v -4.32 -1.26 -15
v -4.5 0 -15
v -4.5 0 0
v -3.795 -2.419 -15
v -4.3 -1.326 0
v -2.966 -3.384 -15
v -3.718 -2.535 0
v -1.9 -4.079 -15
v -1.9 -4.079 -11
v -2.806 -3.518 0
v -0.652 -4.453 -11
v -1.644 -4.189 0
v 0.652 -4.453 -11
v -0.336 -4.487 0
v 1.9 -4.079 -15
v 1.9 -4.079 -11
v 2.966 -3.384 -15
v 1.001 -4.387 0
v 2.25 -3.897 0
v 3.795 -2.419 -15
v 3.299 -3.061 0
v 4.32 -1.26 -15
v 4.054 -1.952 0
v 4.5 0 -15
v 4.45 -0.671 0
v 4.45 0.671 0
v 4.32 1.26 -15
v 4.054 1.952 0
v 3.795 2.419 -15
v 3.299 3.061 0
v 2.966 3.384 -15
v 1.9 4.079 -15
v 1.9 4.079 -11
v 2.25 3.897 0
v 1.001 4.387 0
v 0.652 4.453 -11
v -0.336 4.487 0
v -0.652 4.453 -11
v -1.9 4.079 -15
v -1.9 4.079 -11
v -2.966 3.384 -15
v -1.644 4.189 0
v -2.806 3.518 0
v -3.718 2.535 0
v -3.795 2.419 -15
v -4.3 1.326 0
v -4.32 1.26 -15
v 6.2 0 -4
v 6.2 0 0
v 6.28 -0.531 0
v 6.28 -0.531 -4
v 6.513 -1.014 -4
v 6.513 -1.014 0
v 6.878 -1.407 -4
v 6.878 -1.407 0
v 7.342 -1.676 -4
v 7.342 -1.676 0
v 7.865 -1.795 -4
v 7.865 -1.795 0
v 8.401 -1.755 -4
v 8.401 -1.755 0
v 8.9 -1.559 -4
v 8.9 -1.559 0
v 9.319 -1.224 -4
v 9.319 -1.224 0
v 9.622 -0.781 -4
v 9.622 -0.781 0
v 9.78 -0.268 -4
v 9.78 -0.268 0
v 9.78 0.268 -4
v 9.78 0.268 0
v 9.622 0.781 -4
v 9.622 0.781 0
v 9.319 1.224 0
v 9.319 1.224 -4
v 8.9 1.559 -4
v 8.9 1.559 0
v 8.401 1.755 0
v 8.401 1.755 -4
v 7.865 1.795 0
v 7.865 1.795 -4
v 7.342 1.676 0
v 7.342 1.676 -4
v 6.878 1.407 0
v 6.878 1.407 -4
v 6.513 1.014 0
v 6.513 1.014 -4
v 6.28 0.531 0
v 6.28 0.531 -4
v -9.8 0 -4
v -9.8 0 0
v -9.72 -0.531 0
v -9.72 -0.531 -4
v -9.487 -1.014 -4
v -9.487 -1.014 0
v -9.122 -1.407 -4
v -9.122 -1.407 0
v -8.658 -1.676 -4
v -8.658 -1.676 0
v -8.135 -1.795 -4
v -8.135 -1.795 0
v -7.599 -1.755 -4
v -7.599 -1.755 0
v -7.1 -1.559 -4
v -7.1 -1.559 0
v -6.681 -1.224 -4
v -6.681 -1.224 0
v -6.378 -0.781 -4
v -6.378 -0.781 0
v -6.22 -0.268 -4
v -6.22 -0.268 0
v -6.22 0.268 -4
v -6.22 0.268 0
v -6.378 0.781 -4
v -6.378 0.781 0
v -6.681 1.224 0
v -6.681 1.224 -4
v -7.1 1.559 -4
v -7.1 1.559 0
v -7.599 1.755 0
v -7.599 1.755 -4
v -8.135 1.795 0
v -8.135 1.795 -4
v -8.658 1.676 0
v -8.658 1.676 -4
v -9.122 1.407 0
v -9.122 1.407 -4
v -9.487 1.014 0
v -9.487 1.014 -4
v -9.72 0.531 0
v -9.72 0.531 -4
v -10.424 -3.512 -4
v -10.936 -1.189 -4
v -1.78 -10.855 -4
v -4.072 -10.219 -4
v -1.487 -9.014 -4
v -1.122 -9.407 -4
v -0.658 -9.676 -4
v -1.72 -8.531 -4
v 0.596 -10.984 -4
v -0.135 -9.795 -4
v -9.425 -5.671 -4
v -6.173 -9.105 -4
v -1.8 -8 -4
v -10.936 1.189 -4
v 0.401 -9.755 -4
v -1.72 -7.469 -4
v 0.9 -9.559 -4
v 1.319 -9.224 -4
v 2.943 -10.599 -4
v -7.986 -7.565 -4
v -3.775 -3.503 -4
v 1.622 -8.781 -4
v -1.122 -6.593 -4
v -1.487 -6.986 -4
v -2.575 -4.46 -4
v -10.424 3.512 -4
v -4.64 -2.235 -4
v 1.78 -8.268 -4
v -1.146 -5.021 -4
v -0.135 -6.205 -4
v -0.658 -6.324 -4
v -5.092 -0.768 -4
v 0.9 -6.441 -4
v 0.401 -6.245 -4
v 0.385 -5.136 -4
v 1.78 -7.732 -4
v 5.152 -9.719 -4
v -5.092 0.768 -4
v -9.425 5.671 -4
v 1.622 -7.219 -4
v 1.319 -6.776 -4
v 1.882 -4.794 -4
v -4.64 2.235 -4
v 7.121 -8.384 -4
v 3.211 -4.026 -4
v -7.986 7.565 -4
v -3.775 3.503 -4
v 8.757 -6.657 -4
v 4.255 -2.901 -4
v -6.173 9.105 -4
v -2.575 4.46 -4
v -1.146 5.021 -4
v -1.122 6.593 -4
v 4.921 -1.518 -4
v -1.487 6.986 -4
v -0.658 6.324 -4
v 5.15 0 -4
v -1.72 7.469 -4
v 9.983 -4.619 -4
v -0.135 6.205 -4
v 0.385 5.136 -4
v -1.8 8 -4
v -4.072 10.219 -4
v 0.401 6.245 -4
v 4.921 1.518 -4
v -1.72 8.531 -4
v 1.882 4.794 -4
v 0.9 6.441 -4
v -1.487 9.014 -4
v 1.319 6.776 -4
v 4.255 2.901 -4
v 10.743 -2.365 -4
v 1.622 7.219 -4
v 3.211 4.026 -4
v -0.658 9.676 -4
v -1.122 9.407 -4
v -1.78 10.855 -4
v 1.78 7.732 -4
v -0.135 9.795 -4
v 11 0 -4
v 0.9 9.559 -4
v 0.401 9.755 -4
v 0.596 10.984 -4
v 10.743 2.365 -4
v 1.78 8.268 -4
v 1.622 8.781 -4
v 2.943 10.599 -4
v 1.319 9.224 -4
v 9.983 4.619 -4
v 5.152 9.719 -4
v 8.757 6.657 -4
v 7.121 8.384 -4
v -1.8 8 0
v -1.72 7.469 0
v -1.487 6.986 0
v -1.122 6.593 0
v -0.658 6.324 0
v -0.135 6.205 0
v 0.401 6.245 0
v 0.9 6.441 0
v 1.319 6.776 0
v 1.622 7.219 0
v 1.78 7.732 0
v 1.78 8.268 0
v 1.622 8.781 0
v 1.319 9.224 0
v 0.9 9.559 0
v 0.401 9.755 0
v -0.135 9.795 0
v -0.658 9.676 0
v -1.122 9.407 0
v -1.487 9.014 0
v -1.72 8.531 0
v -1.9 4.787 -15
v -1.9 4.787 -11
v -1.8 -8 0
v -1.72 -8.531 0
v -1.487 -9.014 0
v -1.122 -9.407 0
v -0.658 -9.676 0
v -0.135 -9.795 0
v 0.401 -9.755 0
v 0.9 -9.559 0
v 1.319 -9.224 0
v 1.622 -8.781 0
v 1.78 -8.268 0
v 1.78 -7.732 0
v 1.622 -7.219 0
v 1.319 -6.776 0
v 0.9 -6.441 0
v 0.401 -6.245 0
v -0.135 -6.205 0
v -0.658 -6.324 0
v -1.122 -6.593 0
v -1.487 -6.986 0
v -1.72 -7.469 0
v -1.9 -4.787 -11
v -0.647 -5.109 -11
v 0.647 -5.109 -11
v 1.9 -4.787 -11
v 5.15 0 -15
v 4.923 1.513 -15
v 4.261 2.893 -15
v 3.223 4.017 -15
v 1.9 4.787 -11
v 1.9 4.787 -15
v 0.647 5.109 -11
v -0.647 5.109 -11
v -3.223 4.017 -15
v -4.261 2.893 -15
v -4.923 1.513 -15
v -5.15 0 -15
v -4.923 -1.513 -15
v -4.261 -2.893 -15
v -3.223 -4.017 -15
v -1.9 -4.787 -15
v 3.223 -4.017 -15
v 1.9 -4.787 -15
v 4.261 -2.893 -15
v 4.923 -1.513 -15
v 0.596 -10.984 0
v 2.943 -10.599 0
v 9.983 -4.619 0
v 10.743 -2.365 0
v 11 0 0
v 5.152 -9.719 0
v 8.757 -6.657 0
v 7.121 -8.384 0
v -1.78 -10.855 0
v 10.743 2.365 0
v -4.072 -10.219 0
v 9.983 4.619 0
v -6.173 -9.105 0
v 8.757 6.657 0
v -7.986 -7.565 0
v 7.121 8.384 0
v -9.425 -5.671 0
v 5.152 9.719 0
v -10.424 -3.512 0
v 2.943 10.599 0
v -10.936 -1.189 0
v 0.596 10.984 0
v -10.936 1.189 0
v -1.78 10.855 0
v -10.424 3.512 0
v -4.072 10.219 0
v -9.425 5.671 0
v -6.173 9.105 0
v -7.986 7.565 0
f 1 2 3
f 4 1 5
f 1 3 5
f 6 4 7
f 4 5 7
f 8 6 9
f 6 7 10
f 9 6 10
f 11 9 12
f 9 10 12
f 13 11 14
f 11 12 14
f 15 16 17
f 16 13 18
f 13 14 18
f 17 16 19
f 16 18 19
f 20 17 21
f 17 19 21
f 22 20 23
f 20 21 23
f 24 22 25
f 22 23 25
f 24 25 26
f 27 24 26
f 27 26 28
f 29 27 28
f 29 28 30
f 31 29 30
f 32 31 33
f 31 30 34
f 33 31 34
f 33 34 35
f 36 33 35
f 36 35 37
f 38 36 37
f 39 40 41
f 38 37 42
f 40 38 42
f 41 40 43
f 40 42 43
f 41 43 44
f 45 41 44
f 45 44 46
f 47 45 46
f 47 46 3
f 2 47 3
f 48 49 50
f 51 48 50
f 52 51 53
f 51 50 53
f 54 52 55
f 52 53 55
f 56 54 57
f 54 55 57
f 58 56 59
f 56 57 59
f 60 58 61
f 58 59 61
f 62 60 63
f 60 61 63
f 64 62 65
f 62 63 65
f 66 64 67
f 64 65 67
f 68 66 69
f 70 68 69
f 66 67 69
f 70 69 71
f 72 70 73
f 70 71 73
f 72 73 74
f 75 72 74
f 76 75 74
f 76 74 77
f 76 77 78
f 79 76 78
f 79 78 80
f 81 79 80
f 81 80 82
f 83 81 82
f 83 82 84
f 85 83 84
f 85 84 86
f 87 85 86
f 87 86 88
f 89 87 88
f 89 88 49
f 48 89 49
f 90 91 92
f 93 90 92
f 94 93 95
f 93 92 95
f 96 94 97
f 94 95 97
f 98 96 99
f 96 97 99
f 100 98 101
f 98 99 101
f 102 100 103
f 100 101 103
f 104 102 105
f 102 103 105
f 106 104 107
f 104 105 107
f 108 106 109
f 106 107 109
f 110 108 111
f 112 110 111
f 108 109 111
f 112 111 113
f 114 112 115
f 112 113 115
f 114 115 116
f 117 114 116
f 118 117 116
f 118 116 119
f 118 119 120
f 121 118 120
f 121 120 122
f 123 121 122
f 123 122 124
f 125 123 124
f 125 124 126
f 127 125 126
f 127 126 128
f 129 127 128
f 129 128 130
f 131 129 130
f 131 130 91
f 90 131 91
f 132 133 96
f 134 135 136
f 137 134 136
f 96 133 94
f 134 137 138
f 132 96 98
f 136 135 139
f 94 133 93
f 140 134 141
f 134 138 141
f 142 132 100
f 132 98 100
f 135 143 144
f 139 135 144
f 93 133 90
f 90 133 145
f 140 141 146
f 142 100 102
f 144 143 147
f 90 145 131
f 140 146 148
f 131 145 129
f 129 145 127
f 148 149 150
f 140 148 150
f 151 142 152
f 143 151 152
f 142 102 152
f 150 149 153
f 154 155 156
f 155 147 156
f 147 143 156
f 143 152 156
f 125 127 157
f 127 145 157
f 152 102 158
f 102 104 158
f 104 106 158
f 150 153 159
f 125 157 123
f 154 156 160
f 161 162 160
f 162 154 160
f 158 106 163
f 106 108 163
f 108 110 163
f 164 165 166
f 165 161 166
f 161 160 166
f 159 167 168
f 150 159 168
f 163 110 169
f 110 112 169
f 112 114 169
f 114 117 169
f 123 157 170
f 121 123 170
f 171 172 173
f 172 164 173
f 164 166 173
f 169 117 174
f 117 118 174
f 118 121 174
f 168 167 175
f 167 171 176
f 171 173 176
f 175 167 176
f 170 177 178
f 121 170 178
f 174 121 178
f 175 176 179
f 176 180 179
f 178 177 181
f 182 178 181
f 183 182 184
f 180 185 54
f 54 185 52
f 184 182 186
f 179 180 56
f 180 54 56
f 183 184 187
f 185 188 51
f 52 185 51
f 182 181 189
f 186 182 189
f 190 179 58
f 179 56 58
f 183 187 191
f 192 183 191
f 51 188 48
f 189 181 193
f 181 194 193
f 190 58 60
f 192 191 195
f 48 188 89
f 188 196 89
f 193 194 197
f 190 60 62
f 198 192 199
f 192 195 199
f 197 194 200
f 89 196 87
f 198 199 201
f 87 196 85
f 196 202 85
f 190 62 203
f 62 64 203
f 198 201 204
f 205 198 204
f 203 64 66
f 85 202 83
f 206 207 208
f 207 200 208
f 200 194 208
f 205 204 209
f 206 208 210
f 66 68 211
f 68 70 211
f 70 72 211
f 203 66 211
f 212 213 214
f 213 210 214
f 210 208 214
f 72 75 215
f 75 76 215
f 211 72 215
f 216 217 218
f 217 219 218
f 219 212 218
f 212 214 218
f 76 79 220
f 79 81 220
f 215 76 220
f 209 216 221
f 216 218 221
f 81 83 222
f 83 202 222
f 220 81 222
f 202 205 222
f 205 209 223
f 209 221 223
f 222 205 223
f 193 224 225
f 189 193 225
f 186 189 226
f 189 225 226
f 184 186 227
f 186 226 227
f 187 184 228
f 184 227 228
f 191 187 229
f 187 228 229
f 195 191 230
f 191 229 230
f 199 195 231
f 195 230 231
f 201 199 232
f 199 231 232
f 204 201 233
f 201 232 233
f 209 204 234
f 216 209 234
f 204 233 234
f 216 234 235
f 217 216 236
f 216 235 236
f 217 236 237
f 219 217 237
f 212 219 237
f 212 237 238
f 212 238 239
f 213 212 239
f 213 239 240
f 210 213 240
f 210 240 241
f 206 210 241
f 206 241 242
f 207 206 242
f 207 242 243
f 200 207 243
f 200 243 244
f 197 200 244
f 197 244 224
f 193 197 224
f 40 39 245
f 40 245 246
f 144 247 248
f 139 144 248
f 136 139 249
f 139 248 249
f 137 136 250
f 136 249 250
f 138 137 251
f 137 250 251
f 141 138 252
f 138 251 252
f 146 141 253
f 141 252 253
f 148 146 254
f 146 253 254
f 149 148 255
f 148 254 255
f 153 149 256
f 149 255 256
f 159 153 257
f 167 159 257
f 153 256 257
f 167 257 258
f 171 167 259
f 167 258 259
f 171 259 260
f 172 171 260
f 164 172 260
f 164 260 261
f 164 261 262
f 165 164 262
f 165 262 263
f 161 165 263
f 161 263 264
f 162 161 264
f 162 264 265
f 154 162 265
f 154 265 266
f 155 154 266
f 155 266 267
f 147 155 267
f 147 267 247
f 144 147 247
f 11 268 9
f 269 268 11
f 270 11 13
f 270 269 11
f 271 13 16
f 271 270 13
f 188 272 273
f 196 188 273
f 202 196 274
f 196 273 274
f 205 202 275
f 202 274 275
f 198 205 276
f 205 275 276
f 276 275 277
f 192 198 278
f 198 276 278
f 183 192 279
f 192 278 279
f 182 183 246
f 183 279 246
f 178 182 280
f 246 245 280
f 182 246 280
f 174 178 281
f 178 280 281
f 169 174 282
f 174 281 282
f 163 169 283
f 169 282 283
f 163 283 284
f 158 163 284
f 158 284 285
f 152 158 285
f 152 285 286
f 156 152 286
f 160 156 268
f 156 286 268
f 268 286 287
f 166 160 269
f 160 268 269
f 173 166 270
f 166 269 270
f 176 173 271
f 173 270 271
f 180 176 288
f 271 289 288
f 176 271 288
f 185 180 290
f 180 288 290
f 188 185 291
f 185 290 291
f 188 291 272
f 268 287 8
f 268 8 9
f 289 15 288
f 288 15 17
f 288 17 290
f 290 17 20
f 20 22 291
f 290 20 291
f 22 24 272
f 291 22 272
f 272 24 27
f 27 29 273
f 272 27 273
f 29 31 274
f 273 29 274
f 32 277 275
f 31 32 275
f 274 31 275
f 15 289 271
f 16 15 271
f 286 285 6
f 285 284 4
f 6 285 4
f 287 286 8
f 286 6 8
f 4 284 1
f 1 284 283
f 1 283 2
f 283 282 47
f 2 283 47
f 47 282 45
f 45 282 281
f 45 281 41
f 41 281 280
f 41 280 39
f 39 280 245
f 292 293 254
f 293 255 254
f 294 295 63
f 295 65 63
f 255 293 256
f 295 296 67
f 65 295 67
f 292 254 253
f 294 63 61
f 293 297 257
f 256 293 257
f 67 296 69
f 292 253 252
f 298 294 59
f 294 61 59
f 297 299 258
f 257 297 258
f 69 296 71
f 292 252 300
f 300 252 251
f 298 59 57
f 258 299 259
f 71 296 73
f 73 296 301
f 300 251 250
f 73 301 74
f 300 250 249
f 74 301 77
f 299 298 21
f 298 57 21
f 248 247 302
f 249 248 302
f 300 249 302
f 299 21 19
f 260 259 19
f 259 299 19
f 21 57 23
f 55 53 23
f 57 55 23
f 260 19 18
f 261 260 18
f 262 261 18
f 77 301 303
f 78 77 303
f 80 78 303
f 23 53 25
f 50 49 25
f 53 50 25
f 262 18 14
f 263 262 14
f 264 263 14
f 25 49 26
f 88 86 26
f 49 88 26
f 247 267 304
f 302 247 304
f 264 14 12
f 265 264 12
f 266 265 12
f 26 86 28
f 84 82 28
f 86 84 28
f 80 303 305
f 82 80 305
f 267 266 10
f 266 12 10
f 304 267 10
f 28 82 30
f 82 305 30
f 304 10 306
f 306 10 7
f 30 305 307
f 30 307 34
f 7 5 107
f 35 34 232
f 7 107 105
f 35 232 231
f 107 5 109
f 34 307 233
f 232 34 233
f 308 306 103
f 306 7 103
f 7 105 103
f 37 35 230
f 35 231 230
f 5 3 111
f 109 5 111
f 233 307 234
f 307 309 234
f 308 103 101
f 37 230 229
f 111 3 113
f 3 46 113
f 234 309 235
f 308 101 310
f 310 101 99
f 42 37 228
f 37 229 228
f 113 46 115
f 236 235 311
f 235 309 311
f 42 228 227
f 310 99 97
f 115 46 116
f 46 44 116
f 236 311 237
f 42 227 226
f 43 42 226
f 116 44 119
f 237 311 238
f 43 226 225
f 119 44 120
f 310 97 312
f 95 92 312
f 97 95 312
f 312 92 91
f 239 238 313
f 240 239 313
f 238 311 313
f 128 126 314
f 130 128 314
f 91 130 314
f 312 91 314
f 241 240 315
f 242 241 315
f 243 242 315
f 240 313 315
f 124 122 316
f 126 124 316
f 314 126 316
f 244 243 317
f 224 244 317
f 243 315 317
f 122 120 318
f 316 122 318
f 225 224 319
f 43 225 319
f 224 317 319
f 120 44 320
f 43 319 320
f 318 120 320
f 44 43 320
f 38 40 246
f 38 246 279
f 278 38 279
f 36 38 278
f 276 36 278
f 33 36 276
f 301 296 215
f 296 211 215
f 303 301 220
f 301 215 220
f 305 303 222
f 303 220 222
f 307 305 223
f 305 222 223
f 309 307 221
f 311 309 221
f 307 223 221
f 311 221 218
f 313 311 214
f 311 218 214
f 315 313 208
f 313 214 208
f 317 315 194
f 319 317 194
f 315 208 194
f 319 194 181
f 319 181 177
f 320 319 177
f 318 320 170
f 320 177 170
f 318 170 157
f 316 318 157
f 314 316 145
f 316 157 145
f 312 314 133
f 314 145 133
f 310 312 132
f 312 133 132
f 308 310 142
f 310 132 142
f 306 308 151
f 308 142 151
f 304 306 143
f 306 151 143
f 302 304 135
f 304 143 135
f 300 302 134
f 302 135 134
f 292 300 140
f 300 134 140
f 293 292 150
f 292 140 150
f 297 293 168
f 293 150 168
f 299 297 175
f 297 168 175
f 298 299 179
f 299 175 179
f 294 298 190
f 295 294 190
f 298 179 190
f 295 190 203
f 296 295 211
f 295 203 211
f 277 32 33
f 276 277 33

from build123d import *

# Parameters (mm, degrees)
SKETCH001_R   = 4.5
HOLE_DEPTH    = 25
SKETCH002_W   = 3.8
SKETCH002_H   = 4
POCKET_DEPTH  = 10
SKETCH003_R   = 1.8
HOLE001_DEPTH = 25


with BuildPart() as part:
    # Sketch → Revolution (revolve)
    with BuildSketch(Plane.XZ):
        Polygon((0, 0), (11, 0), (11, -4), (5.15, -4), (5.15, -15), (0, -15), align=None)
    revolve(axis=Axis((0, 0, 0), (0, 0, 1)))

    # Sketch001 (on Face1 of Revolution) → Hole (cut)
    with BuildSketch(Plane(origin=(0, 0, 0), x_dir=(-1, 0, 0), z_dir=(0, 0, 1))):
        Circle(SKETCH001_R)
    extrude(amount=-HOLE_DEPTH, mode=Mode.SUBTRACT)

    # Sketch002 → Pocket (cut, symmetric)
    with BuildSketch(Plane.XZ):
        with Locations((0, -13)):
            Rectangle(SKETCH002_W, SKETCH002_H)
    extrude(amount=POCKET_DEPTH, both=True, mode=Mode.SUBTRACT)

    # Sketch003 (on Face1 of Pocket) → Hole001 (cut)
    with BuildSketch(Plane(origin=(0, 0, 0), x_dir=(-1, 0, 0), z_dir=(0, 0, 1))):
        with Locations((0, 8)):
            Circle(SKETCH003_R)
        with Locations((-8, 0)):
            Circle(SKETCH003_R)
        with Locations((0, -8)):
            Circle(SKETCH003_R)
        with Locations((8, 0)):
            Circle(SKETCH003_R)
    extrude(amount=-HOLE001_DEPTH, mode=Mode.SUBTRACT)


solid = part.part
